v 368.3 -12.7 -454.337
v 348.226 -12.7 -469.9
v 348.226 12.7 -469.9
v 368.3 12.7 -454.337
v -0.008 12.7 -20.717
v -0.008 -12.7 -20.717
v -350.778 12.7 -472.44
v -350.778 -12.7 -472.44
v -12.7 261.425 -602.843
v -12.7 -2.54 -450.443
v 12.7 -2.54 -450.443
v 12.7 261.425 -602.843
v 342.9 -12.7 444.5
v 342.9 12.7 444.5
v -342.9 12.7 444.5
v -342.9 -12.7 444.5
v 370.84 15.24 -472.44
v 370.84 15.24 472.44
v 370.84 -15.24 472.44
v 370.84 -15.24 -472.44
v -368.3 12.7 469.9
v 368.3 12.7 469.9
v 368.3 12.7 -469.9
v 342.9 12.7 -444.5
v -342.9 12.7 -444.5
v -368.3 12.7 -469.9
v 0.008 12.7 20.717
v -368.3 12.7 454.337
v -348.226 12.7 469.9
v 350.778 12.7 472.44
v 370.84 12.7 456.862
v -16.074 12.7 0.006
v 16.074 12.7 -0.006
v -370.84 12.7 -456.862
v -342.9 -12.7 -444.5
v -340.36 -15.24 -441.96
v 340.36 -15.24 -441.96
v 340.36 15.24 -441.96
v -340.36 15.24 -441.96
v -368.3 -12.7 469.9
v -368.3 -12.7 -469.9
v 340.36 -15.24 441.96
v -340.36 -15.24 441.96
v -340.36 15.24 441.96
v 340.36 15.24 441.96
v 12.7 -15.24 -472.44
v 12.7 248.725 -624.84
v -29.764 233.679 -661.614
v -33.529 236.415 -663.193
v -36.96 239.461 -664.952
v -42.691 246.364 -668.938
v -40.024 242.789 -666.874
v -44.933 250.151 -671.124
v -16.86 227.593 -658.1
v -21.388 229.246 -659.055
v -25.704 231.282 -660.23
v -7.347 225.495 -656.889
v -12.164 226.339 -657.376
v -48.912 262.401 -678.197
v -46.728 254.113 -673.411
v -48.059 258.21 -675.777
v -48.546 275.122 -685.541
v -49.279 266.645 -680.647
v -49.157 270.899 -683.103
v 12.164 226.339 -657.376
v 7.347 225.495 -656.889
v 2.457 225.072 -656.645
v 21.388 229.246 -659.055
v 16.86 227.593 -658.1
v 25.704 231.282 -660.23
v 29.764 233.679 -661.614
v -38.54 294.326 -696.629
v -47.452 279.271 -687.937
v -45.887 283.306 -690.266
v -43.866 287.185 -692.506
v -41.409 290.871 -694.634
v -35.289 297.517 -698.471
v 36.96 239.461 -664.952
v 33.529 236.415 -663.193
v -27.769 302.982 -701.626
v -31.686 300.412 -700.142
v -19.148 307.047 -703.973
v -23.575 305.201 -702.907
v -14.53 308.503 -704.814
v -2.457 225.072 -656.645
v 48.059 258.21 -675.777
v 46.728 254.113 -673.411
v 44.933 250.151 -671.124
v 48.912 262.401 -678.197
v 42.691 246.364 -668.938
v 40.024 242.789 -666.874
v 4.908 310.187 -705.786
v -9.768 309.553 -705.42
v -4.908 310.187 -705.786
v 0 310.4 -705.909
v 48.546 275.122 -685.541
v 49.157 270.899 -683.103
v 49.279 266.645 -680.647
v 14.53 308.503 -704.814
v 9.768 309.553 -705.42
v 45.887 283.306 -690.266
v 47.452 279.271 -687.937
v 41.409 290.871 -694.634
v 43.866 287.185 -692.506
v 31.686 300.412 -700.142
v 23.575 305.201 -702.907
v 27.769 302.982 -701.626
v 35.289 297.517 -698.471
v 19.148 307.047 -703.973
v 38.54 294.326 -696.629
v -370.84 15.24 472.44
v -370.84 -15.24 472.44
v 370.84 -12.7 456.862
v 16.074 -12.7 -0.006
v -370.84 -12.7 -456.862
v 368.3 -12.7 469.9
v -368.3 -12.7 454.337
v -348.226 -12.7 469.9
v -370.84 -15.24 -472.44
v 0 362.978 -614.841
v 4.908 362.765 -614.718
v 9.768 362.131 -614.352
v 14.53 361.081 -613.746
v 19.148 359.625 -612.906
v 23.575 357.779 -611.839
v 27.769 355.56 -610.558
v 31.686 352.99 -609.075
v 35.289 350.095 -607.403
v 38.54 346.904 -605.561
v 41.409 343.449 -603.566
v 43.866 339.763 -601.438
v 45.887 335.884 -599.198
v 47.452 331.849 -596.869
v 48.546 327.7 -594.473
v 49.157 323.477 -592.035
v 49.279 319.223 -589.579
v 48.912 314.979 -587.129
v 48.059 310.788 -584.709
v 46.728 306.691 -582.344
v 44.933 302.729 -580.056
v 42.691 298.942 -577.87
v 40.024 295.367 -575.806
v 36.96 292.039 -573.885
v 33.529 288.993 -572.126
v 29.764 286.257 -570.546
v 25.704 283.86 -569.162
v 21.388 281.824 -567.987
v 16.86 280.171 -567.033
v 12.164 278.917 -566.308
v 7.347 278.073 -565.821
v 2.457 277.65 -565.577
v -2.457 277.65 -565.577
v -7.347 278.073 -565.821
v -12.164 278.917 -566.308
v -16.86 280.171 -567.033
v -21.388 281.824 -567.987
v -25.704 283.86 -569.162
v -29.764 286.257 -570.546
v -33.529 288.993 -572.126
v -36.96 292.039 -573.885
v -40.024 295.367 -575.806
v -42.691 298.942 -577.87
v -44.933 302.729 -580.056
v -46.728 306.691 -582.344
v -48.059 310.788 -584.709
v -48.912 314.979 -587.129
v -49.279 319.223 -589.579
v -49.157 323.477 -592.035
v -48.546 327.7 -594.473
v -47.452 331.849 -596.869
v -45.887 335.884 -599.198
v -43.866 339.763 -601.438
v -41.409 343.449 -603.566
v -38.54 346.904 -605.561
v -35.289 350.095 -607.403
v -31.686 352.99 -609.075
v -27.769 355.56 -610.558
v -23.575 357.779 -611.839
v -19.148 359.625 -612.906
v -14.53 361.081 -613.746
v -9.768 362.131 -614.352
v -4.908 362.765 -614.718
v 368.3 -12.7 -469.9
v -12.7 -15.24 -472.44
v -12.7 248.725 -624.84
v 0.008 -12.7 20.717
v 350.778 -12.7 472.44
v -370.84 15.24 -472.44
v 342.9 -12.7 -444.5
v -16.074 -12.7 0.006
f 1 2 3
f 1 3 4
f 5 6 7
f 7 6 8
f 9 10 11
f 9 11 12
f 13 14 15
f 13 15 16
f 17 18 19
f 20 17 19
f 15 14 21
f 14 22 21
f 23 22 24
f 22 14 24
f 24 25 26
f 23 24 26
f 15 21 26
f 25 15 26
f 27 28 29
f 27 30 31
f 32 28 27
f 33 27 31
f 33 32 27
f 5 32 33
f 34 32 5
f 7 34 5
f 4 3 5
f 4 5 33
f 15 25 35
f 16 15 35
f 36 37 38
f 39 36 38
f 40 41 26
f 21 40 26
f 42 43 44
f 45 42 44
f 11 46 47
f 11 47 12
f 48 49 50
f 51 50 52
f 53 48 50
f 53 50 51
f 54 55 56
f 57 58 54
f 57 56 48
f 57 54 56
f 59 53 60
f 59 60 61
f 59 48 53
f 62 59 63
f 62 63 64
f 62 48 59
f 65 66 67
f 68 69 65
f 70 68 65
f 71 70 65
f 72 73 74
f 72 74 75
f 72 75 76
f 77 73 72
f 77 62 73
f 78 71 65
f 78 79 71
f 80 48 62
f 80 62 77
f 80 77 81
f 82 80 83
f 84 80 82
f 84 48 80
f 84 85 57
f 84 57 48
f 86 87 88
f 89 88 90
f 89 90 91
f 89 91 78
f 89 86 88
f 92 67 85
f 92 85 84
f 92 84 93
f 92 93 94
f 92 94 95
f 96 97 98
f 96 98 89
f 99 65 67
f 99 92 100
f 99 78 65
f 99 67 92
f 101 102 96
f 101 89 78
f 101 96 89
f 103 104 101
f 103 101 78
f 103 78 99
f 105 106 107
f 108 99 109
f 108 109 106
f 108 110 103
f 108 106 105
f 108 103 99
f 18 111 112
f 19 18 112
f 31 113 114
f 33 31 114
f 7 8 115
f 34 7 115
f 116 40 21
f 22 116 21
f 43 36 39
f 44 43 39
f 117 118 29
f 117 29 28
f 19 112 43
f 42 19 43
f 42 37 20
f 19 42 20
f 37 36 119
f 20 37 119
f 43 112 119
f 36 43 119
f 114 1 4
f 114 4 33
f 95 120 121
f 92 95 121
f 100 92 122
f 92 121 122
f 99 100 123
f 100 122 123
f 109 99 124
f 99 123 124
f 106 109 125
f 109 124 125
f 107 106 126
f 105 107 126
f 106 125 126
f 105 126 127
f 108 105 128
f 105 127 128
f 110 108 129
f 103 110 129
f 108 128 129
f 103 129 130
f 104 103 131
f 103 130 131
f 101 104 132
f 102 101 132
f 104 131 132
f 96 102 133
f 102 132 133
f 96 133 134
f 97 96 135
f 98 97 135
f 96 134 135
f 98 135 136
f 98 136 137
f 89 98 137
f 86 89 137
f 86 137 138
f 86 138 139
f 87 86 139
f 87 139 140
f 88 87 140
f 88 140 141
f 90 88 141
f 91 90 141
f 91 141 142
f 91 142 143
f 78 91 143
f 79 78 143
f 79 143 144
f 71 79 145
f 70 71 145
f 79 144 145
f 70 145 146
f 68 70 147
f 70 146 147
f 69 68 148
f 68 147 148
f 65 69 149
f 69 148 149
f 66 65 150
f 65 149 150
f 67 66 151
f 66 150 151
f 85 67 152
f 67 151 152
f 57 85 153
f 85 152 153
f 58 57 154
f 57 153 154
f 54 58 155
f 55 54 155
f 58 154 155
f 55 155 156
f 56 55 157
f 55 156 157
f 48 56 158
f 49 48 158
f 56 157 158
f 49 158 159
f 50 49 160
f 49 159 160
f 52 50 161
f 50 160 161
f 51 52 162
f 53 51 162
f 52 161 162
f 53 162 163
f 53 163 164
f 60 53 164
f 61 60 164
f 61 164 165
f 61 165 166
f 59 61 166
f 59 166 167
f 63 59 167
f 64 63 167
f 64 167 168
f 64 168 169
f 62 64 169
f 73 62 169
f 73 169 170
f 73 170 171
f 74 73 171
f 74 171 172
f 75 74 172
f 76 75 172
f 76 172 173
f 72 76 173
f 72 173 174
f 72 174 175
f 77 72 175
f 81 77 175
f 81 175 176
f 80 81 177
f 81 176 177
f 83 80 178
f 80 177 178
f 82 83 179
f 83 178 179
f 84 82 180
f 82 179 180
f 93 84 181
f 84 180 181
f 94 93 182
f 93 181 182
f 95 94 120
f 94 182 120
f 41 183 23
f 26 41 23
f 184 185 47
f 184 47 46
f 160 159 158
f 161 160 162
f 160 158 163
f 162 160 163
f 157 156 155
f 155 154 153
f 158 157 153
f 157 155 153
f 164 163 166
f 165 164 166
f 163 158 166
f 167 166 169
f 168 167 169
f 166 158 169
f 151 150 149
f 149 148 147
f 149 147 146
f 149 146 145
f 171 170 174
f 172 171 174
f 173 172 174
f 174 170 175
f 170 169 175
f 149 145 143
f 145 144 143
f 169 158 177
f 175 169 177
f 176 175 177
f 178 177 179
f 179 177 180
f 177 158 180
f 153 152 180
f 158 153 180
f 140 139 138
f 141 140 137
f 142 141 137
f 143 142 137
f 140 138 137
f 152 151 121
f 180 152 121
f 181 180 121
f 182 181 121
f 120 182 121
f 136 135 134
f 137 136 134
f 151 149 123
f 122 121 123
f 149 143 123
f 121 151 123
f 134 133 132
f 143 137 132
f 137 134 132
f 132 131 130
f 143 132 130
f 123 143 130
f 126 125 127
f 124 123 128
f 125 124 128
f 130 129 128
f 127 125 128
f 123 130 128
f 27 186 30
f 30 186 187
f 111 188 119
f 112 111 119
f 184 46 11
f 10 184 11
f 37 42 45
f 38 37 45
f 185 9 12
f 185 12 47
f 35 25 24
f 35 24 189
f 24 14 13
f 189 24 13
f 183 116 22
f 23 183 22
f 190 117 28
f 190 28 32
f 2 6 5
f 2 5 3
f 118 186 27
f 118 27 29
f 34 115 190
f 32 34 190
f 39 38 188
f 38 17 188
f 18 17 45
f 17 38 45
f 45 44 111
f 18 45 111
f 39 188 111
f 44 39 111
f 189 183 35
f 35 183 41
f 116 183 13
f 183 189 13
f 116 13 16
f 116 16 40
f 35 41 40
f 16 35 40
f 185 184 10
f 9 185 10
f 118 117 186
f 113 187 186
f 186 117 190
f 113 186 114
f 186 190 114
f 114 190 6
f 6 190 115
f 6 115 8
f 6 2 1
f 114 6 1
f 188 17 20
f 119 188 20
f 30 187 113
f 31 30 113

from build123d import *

# Parameters (mm, degrees)
SKETCH1_W                 = 30.48
SKETCH1_H                 = 30.48
SKETCH1_W_2               = 25.4
SKETCH1_H_2               = 25.4
BOSS_EXTRUDE3_DEPTH       = 12.7
BOSS_EXTRUDE3_DEPTH_BACK  = 12.7
BOSS_EXTRUDE13_DEPTH      = 12.7
BOSS_EXTRUDE13_DEPTH_BACK = 12.7
BOSS_EXTRUDE14_DEPTH      = 39.37
BOSS_EXTRUDE14_DEPTH_BACK = 65.786
SKETCH7_R                 = 49.294817714


with BuildPart() as part:
    # Sweep1: sweep along a path in Sketch3
    with BuildLine(Plane(origin=(0, 0, 0), x_dir=(1, 0, 0), z_dir=(0, 1, 0))) as sweep1_path:
        Line((355.6, -457.2), (-355.6, -457.2))
        Line((-355.6, -457.2), (-355.6, 457.2))
        Line((-355.6, 457.2), (355.6, 457.2))
        Line((355.6, 457.2), (355.6, -457.2))
    # Sketch1 → Sweep1 (sweep)
    with BuildSketch(Plane.XY):
        with Locations((-355.6, 0)):
            Rectangle(SKETCH1_W, SKETCH1_H)
        with Locations((-355.6, 0)):
            Rectangle(SKETCH1_W_2, SKETCH1_H_2, mode=Mode.SUBTRACT)
    sweep(path=sweep1_path.line, transition=Transition.RIGHT)


with BuildPart() as body_2:
    # Sketch4 → Boss-Extrude3 (new, two sides: drawn at the far end of the back side and taken through both)
    with BuildSketch(Plane(origin=(0, 0, 0), x_dir=(1, 0, 0), z_dir=(0, 1, 0)).offset(-BOSS_EXTRUDE3_DEPTH_BACK)):
        Polygon((-370.84, 456.861677756), (350.778198584, -472.44), (370.84, -456.861677756), (-350.778198584, 472.44), align=None)
        Polygon((-368.3, -454.337395821), (348.226003109, 469.9), (368.3, 454.337395821), (-348.226003109, -469.9), align=None)
    extrude(amount=BOSS_EXTRUDE3_DEPTH + BOSS_EXTRUDE3_DEPTH_BACK)


with BuildPart() as body_3:
    # Sketch5 → Boss-Extrude13 (new, two sides: drawn at the far end of the back side and taken through both)
    with BuildSketch(Plane(origin=(0, 0, 0), x_dir=(0, 0, -1), z_dir=(1, 0, 0)).offset(-BOSS_EXTRUDE13_DEPTH_BACK)):
        Polygon((624.84, 248.724543073), (472.44, -15.24), (450.442954744, -2.54), (602.842954744, 261.424543073), align=None)
    extrude(amount=BOSS_EXTRUDE13_DEPTH + BOSS_EXTRUDE13_DEPTH_BACK)


with BuildPart() as body_4:
    # Sketch7 → Boss-Extrude14 (new, two sides: drawn at the far end of the back side and taken through both)
    with BuildSketch(Plane(origin=(0, -208.382520882, -360.929113577), x_dir=(-1, 0, 0), z_dir=(0, -0.500000000000001, -0.866025403784438)).offset(-BOSS_EXTRUDE14_DEPTH_BACK)):
        with Locations(Location((0, 572.473478653, 0), (0, 0, 90))):
            Circle(SKETCH7_R)
    extrude(amount=BOSS_EXTRUDE14_DEPTH + BOSS_EXTRUDE14_DEPTH_BACK)


solid = Compound([part.part, body_2.part, body_3.part, body_4.part])
